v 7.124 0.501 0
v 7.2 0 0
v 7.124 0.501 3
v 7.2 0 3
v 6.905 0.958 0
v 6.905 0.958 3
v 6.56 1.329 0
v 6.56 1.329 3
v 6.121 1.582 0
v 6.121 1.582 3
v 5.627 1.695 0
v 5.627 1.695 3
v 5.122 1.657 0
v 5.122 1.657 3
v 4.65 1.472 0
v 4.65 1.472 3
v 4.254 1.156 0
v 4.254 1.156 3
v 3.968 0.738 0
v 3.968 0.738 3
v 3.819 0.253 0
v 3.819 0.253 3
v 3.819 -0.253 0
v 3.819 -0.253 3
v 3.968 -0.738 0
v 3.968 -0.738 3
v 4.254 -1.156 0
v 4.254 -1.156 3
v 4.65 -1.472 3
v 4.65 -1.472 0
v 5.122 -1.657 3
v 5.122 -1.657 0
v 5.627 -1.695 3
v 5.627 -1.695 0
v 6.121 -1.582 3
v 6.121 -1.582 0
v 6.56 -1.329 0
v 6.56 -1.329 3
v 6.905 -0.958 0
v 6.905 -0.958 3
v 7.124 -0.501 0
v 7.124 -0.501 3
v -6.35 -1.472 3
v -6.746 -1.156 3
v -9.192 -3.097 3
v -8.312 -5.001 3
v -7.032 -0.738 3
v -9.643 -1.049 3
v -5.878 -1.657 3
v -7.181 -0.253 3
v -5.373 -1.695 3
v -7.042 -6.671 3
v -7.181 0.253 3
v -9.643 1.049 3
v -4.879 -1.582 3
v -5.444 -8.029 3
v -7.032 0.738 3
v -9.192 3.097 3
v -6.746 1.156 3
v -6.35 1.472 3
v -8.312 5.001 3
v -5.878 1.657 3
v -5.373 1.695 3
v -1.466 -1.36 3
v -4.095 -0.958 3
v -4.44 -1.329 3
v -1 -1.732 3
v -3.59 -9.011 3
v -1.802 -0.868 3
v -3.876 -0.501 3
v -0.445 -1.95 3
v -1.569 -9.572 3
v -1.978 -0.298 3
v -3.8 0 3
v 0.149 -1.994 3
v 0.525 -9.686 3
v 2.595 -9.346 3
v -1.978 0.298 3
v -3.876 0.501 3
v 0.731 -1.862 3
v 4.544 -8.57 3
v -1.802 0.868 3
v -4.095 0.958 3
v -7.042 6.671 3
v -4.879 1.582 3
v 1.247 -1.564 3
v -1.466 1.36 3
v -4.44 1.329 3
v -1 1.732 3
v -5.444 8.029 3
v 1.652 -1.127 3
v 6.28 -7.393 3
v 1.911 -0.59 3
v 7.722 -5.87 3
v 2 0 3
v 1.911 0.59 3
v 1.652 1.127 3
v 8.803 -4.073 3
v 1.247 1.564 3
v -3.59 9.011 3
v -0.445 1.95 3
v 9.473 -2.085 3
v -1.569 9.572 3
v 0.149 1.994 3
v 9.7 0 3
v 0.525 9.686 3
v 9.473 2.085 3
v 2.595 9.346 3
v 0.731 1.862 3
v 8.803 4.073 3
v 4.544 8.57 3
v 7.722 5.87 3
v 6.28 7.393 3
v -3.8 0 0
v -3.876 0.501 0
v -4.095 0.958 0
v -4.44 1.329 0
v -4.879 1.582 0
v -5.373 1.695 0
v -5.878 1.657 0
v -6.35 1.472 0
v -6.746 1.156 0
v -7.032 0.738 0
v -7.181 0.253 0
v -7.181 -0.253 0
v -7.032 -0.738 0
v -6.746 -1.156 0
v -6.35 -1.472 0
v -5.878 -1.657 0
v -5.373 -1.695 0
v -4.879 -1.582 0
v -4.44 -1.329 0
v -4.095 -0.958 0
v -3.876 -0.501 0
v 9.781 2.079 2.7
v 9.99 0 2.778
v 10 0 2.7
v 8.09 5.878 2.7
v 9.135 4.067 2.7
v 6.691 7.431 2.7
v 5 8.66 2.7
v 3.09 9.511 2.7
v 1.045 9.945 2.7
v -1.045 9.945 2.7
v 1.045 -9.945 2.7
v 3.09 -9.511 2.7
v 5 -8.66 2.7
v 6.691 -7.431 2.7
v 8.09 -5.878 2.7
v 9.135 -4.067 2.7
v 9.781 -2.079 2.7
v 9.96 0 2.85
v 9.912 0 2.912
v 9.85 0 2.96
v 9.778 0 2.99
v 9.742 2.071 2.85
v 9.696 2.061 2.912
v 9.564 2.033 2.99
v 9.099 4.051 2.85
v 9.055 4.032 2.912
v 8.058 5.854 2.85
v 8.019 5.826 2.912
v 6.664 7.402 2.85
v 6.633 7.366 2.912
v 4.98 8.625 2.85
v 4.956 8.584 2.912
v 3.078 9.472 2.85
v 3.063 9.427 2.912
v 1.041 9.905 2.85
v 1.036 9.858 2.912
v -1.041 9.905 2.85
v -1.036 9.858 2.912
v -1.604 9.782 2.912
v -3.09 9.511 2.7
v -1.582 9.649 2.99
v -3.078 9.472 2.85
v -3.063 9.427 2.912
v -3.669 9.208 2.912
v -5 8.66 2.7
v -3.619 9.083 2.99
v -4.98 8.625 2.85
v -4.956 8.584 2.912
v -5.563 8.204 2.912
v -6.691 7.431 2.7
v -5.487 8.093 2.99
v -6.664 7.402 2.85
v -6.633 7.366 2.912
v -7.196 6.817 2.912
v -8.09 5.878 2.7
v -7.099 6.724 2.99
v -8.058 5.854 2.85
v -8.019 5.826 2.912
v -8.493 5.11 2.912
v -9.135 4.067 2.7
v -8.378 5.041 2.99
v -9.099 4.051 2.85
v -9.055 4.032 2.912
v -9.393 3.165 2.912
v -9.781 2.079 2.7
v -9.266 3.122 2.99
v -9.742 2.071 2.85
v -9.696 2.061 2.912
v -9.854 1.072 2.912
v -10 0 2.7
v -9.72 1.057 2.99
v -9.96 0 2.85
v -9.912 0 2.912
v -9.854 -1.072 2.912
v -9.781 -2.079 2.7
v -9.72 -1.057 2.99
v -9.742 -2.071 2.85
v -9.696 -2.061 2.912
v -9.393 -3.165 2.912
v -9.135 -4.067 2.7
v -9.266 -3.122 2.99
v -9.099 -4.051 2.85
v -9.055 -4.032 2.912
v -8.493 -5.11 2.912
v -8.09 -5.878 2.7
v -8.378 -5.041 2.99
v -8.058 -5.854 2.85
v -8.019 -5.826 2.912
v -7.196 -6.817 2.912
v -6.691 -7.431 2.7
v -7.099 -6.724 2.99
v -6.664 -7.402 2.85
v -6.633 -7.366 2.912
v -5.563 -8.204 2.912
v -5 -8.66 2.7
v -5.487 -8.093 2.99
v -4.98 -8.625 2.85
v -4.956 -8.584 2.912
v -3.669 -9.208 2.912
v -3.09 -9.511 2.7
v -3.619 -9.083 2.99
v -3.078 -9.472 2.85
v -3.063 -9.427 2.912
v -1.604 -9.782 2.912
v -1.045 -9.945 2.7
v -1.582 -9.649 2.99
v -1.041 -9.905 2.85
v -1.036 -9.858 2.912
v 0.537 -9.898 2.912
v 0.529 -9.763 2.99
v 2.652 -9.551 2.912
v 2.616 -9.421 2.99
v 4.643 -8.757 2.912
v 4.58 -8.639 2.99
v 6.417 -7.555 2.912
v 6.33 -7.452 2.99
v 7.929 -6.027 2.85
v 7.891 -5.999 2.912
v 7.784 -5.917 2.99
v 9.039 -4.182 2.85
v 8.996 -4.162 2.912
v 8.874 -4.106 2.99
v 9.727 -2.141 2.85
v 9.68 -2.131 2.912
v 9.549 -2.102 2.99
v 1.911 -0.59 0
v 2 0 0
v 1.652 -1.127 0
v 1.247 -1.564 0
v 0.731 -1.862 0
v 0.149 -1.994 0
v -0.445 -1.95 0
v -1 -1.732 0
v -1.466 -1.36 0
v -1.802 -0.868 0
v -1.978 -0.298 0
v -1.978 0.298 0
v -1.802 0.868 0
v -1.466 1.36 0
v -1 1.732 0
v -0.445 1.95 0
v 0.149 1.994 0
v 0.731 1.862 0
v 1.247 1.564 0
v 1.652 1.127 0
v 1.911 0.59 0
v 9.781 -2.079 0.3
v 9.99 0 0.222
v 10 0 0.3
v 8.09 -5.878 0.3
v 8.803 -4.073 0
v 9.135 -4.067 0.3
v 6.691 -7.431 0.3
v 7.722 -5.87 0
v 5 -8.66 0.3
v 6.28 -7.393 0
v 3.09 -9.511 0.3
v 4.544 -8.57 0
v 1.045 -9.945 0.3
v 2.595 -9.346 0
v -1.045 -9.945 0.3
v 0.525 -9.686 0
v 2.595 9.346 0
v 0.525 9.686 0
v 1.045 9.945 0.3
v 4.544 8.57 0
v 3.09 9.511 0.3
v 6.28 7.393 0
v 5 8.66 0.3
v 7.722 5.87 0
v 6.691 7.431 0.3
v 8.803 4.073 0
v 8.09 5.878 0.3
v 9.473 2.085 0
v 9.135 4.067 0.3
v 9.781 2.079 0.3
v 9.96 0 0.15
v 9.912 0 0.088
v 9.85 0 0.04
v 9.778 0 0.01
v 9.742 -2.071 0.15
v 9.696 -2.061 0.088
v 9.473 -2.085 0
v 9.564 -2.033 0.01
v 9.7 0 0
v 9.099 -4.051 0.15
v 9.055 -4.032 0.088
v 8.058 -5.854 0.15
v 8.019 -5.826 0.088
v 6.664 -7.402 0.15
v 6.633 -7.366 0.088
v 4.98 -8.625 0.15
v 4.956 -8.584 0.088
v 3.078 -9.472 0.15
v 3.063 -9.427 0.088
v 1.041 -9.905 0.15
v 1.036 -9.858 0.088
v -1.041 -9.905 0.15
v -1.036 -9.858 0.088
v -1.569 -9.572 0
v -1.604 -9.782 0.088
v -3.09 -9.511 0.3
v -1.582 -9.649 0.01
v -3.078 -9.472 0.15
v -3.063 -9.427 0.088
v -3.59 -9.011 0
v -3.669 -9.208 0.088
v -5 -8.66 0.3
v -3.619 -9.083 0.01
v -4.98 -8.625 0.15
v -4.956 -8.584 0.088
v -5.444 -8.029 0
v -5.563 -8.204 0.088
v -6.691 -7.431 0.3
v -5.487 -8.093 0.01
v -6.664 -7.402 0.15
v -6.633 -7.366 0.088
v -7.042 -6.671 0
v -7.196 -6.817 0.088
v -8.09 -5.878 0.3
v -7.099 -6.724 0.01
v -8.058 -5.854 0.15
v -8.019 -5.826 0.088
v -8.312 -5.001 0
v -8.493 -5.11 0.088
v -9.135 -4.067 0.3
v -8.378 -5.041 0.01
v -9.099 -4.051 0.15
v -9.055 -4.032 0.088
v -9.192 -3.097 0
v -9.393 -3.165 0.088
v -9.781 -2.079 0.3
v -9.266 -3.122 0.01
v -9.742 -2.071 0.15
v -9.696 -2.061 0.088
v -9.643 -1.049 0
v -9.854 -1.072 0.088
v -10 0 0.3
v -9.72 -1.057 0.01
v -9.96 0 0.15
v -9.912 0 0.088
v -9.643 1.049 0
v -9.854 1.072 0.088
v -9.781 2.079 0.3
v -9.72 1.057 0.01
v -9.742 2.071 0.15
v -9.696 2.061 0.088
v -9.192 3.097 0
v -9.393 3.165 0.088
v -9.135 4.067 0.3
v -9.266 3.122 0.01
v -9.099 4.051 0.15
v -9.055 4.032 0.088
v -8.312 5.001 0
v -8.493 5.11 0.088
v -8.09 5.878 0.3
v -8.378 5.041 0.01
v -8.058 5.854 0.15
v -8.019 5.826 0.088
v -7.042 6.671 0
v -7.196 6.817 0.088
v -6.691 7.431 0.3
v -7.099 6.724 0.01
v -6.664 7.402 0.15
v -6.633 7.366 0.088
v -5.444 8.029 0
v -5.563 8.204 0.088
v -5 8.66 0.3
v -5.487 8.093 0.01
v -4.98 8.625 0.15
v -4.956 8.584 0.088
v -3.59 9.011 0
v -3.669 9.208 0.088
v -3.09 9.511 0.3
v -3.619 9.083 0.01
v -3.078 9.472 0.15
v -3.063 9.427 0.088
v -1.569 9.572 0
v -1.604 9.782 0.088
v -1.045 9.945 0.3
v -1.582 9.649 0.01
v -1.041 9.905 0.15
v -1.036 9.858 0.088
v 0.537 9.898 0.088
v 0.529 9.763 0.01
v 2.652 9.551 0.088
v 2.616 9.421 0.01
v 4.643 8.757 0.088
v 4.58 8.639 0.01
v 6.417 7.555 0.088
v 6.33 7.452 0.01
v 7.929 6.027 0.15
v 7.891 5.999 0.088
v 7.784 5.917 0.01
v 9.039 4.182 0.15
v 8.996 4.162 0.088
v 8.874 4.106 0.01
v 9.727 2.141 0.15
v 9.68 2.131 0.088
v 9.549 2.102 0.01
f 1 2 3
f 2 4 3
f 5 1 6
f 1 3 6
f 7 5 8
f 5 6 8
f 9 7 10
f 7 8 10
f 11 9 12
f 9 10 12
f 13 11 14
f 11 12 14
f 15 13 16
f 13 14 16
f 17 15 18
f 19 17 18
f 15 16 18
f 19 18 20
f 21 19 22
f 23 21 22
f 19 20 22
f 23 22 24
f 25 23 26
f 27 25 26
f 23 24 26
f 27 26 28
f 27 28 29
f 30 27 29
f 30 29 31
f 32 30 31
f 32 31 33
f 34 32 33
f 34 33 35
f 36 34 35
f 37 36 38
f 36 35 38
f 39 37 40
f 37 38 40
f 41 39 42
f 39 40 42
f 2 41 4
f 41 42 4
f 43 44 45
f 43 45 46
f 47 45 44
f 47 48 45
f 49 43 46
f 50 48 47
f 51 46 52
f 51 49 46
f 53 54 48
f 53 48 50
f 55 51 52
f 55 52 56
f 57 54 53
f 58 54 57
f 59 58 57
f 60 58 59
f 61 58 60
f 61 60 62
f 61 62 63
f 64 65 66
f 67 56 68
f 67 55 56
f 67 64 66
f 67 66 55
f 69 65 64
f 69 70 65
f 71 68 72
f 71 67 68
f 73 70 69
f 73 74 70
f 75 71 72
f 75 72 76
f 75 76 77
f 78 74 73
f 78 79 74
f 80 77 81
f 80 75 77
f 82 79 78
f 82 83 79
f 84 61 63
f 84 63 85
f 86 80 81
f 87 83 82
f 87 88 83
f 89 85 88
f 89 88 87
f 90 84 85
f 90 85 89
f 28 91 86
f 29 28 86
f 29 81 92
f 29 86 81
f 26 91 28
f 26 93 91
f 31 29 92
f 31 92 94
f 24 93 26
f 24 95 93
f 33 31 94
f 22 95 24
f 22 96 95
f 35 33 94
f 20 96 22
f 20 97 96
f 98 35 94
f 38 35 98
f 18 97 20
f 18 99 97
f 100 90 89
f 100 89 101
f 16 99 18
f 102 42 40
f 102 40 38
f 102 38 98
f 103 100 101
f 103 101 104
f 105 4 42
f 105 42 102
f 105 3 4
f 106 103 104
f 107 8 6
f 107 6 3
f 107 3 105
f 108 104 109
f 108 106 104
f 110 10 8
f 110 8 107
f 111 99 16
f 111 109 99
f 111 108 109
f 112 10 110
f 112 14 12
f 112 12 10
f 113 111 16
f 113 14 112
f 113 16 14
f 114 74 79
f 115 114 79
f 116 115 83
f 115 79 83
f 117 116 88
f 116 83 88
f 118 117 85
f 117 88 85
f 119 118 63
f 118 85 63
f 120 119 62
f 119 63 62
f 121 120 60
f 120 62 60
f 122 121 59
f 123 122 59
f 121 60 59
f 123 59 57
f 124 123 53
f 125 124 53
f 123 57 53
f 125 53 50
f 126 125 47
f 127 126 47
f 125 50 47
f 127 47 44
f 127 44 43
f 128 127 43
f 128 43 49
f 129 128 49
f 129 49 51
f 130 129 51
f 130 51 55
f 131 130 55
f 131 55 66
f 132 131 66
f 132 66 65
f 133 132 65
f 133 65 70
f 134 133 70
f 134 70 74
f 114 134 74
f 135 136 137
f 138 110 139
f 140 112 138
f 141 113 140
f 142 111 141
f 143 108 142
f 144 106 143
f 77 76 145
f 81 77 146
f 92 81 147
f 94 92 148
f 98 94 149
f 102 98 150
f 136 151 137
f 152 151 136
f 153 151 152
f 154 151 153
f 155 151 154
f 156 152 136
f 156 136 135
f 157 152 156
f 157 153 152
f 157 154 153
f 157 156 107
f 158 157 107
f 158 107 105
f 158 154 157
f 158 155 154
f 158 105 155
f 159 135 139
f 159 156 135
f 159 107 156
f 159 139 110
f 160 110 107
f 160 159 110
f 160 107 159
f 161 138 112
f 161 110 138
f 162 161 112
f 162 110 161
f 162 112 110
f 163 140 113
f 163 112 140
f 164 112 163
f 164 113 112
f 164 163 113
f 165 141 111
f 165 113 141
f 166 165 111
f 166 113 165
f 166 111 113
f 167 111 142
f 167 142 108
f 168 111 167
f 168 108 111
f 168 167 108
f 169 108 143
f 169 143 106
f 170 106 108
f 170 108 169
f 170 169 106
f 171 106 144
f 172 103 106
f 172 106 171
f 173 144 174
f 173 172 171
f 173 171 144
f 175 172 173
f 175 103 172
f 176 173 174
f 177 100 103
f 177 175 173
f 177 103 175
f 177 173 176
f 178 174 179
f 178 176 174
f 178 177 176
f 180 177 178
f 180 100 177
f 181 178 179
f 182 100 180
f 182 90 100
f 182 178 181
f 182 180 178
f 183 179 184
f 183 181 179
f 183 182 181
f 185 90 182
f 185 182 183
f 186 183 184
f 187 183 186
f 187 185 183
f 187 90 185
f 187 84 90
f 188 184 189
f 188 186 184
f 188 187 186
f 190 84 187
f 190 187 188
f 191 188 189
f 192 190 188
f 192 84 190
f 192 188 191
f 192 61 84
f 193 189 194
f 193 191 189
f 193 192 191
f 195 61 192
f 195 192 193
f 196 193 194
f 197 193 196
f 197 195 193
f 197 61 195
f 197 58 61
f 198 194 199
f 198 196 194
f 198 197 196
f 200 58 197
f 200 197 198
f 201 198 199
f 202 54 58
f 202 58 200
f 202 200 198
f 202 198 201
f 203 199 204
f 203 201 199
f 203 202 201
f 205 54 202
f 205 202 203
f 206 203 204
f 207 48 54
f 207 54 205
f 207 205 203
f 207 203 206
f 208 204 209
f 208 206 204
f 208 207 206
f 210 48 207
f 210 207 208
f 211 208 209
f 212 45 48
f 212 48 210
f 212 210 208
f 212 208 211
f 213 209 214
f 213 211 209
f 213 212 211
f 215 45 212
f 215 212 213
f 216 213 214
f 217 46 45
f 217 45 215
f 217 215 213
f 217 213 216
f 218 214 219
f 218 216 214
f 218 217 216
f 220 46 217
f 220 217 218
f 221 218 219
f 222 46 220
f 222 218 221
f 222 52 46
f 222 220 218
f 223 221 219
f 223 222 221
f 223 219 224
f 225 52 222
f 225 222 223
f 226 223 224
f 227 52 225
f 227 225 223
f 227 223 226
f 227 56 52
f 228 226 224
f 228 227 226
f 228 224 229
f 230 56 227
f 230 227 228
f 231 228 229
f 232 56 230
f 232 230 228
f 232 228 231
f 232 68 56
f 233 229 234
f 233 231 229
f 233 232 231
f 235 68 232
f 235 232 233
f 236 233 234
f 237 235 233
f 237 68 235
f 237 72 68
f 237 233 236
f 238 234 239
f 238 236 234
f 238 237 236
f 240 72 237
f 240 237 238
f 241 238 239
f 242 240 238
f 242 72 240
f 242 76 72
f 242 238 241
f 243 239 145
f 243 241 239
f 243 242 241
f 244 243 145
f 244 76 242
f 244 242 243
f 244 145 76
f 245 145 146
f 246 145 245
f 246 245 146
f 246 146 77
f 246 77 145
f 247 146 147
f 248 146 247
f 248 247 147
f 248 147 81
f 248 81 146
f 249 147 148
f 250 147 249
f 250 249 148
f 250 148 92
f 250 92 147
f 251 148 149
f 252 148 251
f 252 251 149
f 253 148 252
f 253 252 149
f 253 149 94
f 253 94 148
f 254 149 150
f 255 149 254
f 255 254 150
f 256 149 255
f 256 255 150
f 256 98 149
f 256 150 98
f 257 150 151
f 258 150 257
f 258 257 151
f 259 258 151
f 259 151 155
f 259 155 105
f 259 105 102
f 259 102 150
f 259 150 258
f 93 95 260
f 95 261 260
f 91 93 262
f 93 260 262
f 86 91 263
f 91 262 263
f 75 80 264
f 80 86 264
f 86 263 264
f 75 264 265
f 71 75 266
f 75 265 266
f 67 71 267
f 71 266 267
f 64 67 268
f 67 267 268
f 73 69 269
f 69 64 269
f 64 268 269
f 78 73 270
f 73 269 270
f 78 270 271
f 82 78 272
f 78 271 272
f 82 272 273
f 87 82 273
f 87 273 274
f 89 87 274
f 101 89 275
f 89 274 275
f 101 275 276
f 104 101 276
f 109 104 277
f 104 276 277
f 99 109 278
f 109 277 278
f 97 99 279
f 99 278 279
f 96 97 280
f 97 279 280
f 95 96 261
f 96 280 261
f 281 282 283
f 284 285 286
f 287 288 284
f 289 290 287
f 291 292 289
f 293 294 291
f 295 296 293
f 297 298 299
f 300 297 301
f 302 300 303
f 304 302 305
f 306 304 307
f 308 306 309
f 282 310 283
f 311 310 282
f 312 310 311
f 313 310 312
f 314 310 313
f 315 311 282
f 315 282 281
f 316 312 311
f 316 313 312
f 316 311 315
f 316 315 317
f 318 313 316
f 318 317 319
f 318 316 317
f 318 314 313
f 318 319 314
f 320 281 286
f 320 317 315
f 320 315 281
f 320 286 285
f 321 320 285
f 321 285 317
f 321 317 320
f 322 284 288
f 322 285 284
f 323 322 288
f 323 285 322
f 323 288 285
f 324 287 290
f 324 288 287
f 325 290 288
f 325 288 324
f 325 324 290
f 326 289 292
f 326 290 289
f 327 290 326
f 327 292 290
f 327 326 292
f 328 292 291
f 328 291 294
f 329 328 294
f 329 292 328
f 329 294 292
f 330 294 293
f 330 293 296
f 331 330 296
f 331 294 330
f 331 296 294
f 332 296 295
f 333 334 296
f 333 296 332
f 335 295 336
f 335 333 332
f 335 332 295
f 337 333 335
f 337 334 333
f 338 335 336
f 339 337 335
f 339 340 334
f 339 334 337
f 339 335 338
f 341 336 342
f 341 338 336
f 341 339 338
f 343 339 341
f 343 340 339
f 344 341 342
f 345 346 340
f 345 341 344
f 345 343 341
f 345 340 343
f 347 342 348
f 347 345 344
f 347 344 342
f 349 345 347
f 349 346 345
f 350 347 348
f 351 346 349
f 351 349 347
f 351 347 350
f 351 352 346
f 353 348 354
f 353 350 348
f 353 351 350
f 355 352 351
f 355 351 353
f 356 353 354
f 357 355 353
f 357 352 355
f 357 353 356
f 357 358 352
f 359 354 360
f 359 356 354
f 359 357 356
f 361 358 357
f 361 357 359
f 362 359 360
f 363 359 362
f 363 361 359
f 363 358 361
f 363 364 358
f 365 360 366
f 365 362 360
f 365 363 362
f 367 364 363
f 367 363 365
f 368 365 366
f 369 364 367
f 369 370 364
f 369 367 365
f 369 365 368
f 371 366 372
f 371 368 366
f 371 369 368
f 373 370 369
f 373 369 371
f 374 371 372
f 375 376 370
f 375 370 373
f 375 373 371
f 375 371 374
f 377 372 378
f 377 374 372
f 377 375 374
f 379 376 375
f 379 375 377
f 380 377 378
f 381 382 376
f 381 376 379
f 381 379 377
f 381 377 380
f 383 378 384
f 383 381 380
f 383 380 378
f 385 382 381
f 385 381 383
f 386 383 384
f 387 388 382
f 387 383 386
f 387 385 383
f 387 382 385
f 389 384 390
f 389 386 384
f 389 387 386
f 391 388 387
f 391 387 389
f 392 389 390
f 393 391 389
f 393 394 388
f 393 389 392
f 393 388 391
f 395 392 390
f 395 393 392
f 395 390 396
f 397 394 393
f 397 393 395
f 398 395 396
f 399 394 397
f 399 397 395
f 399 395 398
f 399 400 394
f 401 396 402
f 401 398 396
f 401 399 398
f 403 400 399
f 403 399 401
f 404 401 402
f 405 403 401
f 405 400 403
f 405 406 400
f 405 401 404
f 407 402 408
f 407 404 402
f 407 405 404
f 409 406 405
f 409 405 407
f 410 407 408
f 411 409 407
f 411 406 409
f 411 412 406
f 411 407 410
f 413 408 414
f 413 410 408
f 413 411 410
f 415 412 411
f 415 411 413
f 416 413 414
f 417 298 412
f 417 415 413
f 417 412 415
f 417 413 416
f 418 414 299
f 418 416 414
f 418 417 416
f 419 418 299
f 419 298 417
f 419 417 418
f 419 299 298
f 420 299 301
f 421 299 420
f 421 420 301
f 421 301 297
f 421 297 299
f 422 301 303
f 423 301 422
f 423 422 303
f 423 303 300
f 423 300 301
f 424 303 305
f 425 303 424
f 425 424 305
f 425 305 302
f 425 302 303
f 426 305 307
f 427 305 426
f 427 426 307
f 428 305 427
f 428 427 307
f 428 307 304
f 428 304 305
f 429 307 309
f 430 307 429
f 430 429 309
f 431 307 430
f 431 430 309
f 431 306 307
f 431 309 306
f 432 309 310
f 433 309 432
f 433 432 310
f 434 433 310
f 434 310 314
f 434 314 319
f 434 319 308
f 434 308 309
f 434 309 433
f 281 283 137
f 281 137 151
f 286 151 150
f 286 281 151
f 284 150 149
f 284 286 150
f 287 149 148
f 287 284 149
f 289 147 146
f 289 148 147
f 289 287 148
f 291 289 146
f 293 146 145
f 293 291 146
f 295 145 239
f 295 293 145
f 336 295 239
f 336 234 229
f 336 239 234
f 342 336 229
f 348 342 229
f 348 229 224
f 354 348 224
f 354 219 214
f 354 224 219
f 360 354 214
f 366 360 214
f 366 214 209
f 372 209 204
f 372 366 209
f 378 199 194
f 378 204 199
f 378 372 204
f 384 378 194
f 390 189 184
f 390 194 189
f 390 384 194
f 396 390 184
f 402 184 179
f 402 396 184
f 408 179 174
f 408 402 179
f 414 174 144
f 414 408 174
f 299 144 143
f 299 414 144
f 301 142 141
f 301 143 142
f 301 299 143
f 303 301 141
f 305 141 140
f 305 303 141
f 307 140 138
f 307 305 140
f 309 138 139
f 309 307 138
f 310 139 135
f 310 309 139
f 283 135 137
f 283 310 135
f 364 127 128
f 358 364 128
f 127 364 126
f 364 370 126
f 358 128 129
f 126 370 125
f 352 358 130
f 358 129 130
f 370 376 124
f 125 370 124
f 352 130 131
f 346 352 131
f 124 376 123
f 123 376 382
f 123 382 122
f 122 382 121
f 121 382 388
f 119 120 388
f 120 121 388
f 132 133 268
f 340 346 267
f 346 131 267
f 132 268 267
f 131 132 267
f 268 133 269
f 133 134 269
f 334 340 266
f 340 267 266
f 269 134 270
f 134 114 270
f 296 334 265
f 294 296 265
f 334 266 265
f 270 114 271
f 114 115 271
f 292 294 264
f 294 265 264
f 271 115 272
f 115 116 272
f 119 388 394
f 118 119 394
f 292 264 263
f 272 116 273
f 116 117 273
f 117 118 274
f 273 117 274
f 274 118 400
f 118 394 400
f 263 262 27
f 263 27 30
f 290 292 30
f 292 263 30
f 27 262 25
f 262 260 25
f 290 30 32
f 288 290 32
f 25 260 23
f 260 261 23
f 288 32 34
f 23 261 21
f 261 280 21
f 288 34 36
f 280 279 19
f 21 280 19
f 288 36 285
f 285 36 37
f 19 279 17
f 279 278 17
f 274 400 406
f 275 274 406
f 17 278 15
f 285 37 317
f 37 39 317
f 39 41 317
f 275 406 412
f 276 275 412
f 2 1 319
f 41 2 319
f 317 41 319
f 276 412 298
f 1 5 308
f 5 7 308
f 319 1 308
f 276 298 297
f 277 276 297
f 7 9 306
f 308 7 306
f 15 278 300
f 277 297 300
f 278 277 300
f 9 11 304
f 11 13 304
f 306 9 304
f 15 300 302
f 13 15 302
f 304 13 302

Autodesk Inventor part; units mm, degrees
ref_plane "YZ Plane" through (0, 0, 0) normal (1, 0, 0) x (0, 1, 0)
ref_plane "XZ Plane" through (0, 0, 0) normal (0, 1, 0) x (-1, 0, 0)
ref_plane "XY Plane" through (0, 0, 0) normal (0, 0, 1) x (1, 0, 0)
sketch "スケッチ1" plane through (0, 0, 0) normal (0, 0, 1) x (1, 0, 0)
  circle A0 centre (0, 0) radius 10
  circle A1 centre (0, 0) radius 2
  dimension "d0" = 20
  dimension "d1" = 4
extrude "押し出し1" add sketch "スケッチ1" along normal blind 3
sketch "スケッチ2" plane through (0, 0, 3) normal (0, 0, 1) x (1, 0, 0)
  circle A0 centre (0, 0) radius 5.5
  circle A1 centre (-5.5, 0) radius 1.7
  circle A2 centre (5.5, 0) radius 1.7
  dimension "d4" = 11
  dimension "d5" = 3.4
  dimension "d6" = 3.4
extrude "押し出し2" cut sketch "スケッチ2" against normal blind 3 contours A0 A2 | A0 A2 | A1 A0 | A0 A1
fillet "フィレット1" radius 0.3 2 edges at (-10, 0, 3) (-10, 0, 0)
properties part number "homemade_setcolor" material "アルミニウム 6061"
